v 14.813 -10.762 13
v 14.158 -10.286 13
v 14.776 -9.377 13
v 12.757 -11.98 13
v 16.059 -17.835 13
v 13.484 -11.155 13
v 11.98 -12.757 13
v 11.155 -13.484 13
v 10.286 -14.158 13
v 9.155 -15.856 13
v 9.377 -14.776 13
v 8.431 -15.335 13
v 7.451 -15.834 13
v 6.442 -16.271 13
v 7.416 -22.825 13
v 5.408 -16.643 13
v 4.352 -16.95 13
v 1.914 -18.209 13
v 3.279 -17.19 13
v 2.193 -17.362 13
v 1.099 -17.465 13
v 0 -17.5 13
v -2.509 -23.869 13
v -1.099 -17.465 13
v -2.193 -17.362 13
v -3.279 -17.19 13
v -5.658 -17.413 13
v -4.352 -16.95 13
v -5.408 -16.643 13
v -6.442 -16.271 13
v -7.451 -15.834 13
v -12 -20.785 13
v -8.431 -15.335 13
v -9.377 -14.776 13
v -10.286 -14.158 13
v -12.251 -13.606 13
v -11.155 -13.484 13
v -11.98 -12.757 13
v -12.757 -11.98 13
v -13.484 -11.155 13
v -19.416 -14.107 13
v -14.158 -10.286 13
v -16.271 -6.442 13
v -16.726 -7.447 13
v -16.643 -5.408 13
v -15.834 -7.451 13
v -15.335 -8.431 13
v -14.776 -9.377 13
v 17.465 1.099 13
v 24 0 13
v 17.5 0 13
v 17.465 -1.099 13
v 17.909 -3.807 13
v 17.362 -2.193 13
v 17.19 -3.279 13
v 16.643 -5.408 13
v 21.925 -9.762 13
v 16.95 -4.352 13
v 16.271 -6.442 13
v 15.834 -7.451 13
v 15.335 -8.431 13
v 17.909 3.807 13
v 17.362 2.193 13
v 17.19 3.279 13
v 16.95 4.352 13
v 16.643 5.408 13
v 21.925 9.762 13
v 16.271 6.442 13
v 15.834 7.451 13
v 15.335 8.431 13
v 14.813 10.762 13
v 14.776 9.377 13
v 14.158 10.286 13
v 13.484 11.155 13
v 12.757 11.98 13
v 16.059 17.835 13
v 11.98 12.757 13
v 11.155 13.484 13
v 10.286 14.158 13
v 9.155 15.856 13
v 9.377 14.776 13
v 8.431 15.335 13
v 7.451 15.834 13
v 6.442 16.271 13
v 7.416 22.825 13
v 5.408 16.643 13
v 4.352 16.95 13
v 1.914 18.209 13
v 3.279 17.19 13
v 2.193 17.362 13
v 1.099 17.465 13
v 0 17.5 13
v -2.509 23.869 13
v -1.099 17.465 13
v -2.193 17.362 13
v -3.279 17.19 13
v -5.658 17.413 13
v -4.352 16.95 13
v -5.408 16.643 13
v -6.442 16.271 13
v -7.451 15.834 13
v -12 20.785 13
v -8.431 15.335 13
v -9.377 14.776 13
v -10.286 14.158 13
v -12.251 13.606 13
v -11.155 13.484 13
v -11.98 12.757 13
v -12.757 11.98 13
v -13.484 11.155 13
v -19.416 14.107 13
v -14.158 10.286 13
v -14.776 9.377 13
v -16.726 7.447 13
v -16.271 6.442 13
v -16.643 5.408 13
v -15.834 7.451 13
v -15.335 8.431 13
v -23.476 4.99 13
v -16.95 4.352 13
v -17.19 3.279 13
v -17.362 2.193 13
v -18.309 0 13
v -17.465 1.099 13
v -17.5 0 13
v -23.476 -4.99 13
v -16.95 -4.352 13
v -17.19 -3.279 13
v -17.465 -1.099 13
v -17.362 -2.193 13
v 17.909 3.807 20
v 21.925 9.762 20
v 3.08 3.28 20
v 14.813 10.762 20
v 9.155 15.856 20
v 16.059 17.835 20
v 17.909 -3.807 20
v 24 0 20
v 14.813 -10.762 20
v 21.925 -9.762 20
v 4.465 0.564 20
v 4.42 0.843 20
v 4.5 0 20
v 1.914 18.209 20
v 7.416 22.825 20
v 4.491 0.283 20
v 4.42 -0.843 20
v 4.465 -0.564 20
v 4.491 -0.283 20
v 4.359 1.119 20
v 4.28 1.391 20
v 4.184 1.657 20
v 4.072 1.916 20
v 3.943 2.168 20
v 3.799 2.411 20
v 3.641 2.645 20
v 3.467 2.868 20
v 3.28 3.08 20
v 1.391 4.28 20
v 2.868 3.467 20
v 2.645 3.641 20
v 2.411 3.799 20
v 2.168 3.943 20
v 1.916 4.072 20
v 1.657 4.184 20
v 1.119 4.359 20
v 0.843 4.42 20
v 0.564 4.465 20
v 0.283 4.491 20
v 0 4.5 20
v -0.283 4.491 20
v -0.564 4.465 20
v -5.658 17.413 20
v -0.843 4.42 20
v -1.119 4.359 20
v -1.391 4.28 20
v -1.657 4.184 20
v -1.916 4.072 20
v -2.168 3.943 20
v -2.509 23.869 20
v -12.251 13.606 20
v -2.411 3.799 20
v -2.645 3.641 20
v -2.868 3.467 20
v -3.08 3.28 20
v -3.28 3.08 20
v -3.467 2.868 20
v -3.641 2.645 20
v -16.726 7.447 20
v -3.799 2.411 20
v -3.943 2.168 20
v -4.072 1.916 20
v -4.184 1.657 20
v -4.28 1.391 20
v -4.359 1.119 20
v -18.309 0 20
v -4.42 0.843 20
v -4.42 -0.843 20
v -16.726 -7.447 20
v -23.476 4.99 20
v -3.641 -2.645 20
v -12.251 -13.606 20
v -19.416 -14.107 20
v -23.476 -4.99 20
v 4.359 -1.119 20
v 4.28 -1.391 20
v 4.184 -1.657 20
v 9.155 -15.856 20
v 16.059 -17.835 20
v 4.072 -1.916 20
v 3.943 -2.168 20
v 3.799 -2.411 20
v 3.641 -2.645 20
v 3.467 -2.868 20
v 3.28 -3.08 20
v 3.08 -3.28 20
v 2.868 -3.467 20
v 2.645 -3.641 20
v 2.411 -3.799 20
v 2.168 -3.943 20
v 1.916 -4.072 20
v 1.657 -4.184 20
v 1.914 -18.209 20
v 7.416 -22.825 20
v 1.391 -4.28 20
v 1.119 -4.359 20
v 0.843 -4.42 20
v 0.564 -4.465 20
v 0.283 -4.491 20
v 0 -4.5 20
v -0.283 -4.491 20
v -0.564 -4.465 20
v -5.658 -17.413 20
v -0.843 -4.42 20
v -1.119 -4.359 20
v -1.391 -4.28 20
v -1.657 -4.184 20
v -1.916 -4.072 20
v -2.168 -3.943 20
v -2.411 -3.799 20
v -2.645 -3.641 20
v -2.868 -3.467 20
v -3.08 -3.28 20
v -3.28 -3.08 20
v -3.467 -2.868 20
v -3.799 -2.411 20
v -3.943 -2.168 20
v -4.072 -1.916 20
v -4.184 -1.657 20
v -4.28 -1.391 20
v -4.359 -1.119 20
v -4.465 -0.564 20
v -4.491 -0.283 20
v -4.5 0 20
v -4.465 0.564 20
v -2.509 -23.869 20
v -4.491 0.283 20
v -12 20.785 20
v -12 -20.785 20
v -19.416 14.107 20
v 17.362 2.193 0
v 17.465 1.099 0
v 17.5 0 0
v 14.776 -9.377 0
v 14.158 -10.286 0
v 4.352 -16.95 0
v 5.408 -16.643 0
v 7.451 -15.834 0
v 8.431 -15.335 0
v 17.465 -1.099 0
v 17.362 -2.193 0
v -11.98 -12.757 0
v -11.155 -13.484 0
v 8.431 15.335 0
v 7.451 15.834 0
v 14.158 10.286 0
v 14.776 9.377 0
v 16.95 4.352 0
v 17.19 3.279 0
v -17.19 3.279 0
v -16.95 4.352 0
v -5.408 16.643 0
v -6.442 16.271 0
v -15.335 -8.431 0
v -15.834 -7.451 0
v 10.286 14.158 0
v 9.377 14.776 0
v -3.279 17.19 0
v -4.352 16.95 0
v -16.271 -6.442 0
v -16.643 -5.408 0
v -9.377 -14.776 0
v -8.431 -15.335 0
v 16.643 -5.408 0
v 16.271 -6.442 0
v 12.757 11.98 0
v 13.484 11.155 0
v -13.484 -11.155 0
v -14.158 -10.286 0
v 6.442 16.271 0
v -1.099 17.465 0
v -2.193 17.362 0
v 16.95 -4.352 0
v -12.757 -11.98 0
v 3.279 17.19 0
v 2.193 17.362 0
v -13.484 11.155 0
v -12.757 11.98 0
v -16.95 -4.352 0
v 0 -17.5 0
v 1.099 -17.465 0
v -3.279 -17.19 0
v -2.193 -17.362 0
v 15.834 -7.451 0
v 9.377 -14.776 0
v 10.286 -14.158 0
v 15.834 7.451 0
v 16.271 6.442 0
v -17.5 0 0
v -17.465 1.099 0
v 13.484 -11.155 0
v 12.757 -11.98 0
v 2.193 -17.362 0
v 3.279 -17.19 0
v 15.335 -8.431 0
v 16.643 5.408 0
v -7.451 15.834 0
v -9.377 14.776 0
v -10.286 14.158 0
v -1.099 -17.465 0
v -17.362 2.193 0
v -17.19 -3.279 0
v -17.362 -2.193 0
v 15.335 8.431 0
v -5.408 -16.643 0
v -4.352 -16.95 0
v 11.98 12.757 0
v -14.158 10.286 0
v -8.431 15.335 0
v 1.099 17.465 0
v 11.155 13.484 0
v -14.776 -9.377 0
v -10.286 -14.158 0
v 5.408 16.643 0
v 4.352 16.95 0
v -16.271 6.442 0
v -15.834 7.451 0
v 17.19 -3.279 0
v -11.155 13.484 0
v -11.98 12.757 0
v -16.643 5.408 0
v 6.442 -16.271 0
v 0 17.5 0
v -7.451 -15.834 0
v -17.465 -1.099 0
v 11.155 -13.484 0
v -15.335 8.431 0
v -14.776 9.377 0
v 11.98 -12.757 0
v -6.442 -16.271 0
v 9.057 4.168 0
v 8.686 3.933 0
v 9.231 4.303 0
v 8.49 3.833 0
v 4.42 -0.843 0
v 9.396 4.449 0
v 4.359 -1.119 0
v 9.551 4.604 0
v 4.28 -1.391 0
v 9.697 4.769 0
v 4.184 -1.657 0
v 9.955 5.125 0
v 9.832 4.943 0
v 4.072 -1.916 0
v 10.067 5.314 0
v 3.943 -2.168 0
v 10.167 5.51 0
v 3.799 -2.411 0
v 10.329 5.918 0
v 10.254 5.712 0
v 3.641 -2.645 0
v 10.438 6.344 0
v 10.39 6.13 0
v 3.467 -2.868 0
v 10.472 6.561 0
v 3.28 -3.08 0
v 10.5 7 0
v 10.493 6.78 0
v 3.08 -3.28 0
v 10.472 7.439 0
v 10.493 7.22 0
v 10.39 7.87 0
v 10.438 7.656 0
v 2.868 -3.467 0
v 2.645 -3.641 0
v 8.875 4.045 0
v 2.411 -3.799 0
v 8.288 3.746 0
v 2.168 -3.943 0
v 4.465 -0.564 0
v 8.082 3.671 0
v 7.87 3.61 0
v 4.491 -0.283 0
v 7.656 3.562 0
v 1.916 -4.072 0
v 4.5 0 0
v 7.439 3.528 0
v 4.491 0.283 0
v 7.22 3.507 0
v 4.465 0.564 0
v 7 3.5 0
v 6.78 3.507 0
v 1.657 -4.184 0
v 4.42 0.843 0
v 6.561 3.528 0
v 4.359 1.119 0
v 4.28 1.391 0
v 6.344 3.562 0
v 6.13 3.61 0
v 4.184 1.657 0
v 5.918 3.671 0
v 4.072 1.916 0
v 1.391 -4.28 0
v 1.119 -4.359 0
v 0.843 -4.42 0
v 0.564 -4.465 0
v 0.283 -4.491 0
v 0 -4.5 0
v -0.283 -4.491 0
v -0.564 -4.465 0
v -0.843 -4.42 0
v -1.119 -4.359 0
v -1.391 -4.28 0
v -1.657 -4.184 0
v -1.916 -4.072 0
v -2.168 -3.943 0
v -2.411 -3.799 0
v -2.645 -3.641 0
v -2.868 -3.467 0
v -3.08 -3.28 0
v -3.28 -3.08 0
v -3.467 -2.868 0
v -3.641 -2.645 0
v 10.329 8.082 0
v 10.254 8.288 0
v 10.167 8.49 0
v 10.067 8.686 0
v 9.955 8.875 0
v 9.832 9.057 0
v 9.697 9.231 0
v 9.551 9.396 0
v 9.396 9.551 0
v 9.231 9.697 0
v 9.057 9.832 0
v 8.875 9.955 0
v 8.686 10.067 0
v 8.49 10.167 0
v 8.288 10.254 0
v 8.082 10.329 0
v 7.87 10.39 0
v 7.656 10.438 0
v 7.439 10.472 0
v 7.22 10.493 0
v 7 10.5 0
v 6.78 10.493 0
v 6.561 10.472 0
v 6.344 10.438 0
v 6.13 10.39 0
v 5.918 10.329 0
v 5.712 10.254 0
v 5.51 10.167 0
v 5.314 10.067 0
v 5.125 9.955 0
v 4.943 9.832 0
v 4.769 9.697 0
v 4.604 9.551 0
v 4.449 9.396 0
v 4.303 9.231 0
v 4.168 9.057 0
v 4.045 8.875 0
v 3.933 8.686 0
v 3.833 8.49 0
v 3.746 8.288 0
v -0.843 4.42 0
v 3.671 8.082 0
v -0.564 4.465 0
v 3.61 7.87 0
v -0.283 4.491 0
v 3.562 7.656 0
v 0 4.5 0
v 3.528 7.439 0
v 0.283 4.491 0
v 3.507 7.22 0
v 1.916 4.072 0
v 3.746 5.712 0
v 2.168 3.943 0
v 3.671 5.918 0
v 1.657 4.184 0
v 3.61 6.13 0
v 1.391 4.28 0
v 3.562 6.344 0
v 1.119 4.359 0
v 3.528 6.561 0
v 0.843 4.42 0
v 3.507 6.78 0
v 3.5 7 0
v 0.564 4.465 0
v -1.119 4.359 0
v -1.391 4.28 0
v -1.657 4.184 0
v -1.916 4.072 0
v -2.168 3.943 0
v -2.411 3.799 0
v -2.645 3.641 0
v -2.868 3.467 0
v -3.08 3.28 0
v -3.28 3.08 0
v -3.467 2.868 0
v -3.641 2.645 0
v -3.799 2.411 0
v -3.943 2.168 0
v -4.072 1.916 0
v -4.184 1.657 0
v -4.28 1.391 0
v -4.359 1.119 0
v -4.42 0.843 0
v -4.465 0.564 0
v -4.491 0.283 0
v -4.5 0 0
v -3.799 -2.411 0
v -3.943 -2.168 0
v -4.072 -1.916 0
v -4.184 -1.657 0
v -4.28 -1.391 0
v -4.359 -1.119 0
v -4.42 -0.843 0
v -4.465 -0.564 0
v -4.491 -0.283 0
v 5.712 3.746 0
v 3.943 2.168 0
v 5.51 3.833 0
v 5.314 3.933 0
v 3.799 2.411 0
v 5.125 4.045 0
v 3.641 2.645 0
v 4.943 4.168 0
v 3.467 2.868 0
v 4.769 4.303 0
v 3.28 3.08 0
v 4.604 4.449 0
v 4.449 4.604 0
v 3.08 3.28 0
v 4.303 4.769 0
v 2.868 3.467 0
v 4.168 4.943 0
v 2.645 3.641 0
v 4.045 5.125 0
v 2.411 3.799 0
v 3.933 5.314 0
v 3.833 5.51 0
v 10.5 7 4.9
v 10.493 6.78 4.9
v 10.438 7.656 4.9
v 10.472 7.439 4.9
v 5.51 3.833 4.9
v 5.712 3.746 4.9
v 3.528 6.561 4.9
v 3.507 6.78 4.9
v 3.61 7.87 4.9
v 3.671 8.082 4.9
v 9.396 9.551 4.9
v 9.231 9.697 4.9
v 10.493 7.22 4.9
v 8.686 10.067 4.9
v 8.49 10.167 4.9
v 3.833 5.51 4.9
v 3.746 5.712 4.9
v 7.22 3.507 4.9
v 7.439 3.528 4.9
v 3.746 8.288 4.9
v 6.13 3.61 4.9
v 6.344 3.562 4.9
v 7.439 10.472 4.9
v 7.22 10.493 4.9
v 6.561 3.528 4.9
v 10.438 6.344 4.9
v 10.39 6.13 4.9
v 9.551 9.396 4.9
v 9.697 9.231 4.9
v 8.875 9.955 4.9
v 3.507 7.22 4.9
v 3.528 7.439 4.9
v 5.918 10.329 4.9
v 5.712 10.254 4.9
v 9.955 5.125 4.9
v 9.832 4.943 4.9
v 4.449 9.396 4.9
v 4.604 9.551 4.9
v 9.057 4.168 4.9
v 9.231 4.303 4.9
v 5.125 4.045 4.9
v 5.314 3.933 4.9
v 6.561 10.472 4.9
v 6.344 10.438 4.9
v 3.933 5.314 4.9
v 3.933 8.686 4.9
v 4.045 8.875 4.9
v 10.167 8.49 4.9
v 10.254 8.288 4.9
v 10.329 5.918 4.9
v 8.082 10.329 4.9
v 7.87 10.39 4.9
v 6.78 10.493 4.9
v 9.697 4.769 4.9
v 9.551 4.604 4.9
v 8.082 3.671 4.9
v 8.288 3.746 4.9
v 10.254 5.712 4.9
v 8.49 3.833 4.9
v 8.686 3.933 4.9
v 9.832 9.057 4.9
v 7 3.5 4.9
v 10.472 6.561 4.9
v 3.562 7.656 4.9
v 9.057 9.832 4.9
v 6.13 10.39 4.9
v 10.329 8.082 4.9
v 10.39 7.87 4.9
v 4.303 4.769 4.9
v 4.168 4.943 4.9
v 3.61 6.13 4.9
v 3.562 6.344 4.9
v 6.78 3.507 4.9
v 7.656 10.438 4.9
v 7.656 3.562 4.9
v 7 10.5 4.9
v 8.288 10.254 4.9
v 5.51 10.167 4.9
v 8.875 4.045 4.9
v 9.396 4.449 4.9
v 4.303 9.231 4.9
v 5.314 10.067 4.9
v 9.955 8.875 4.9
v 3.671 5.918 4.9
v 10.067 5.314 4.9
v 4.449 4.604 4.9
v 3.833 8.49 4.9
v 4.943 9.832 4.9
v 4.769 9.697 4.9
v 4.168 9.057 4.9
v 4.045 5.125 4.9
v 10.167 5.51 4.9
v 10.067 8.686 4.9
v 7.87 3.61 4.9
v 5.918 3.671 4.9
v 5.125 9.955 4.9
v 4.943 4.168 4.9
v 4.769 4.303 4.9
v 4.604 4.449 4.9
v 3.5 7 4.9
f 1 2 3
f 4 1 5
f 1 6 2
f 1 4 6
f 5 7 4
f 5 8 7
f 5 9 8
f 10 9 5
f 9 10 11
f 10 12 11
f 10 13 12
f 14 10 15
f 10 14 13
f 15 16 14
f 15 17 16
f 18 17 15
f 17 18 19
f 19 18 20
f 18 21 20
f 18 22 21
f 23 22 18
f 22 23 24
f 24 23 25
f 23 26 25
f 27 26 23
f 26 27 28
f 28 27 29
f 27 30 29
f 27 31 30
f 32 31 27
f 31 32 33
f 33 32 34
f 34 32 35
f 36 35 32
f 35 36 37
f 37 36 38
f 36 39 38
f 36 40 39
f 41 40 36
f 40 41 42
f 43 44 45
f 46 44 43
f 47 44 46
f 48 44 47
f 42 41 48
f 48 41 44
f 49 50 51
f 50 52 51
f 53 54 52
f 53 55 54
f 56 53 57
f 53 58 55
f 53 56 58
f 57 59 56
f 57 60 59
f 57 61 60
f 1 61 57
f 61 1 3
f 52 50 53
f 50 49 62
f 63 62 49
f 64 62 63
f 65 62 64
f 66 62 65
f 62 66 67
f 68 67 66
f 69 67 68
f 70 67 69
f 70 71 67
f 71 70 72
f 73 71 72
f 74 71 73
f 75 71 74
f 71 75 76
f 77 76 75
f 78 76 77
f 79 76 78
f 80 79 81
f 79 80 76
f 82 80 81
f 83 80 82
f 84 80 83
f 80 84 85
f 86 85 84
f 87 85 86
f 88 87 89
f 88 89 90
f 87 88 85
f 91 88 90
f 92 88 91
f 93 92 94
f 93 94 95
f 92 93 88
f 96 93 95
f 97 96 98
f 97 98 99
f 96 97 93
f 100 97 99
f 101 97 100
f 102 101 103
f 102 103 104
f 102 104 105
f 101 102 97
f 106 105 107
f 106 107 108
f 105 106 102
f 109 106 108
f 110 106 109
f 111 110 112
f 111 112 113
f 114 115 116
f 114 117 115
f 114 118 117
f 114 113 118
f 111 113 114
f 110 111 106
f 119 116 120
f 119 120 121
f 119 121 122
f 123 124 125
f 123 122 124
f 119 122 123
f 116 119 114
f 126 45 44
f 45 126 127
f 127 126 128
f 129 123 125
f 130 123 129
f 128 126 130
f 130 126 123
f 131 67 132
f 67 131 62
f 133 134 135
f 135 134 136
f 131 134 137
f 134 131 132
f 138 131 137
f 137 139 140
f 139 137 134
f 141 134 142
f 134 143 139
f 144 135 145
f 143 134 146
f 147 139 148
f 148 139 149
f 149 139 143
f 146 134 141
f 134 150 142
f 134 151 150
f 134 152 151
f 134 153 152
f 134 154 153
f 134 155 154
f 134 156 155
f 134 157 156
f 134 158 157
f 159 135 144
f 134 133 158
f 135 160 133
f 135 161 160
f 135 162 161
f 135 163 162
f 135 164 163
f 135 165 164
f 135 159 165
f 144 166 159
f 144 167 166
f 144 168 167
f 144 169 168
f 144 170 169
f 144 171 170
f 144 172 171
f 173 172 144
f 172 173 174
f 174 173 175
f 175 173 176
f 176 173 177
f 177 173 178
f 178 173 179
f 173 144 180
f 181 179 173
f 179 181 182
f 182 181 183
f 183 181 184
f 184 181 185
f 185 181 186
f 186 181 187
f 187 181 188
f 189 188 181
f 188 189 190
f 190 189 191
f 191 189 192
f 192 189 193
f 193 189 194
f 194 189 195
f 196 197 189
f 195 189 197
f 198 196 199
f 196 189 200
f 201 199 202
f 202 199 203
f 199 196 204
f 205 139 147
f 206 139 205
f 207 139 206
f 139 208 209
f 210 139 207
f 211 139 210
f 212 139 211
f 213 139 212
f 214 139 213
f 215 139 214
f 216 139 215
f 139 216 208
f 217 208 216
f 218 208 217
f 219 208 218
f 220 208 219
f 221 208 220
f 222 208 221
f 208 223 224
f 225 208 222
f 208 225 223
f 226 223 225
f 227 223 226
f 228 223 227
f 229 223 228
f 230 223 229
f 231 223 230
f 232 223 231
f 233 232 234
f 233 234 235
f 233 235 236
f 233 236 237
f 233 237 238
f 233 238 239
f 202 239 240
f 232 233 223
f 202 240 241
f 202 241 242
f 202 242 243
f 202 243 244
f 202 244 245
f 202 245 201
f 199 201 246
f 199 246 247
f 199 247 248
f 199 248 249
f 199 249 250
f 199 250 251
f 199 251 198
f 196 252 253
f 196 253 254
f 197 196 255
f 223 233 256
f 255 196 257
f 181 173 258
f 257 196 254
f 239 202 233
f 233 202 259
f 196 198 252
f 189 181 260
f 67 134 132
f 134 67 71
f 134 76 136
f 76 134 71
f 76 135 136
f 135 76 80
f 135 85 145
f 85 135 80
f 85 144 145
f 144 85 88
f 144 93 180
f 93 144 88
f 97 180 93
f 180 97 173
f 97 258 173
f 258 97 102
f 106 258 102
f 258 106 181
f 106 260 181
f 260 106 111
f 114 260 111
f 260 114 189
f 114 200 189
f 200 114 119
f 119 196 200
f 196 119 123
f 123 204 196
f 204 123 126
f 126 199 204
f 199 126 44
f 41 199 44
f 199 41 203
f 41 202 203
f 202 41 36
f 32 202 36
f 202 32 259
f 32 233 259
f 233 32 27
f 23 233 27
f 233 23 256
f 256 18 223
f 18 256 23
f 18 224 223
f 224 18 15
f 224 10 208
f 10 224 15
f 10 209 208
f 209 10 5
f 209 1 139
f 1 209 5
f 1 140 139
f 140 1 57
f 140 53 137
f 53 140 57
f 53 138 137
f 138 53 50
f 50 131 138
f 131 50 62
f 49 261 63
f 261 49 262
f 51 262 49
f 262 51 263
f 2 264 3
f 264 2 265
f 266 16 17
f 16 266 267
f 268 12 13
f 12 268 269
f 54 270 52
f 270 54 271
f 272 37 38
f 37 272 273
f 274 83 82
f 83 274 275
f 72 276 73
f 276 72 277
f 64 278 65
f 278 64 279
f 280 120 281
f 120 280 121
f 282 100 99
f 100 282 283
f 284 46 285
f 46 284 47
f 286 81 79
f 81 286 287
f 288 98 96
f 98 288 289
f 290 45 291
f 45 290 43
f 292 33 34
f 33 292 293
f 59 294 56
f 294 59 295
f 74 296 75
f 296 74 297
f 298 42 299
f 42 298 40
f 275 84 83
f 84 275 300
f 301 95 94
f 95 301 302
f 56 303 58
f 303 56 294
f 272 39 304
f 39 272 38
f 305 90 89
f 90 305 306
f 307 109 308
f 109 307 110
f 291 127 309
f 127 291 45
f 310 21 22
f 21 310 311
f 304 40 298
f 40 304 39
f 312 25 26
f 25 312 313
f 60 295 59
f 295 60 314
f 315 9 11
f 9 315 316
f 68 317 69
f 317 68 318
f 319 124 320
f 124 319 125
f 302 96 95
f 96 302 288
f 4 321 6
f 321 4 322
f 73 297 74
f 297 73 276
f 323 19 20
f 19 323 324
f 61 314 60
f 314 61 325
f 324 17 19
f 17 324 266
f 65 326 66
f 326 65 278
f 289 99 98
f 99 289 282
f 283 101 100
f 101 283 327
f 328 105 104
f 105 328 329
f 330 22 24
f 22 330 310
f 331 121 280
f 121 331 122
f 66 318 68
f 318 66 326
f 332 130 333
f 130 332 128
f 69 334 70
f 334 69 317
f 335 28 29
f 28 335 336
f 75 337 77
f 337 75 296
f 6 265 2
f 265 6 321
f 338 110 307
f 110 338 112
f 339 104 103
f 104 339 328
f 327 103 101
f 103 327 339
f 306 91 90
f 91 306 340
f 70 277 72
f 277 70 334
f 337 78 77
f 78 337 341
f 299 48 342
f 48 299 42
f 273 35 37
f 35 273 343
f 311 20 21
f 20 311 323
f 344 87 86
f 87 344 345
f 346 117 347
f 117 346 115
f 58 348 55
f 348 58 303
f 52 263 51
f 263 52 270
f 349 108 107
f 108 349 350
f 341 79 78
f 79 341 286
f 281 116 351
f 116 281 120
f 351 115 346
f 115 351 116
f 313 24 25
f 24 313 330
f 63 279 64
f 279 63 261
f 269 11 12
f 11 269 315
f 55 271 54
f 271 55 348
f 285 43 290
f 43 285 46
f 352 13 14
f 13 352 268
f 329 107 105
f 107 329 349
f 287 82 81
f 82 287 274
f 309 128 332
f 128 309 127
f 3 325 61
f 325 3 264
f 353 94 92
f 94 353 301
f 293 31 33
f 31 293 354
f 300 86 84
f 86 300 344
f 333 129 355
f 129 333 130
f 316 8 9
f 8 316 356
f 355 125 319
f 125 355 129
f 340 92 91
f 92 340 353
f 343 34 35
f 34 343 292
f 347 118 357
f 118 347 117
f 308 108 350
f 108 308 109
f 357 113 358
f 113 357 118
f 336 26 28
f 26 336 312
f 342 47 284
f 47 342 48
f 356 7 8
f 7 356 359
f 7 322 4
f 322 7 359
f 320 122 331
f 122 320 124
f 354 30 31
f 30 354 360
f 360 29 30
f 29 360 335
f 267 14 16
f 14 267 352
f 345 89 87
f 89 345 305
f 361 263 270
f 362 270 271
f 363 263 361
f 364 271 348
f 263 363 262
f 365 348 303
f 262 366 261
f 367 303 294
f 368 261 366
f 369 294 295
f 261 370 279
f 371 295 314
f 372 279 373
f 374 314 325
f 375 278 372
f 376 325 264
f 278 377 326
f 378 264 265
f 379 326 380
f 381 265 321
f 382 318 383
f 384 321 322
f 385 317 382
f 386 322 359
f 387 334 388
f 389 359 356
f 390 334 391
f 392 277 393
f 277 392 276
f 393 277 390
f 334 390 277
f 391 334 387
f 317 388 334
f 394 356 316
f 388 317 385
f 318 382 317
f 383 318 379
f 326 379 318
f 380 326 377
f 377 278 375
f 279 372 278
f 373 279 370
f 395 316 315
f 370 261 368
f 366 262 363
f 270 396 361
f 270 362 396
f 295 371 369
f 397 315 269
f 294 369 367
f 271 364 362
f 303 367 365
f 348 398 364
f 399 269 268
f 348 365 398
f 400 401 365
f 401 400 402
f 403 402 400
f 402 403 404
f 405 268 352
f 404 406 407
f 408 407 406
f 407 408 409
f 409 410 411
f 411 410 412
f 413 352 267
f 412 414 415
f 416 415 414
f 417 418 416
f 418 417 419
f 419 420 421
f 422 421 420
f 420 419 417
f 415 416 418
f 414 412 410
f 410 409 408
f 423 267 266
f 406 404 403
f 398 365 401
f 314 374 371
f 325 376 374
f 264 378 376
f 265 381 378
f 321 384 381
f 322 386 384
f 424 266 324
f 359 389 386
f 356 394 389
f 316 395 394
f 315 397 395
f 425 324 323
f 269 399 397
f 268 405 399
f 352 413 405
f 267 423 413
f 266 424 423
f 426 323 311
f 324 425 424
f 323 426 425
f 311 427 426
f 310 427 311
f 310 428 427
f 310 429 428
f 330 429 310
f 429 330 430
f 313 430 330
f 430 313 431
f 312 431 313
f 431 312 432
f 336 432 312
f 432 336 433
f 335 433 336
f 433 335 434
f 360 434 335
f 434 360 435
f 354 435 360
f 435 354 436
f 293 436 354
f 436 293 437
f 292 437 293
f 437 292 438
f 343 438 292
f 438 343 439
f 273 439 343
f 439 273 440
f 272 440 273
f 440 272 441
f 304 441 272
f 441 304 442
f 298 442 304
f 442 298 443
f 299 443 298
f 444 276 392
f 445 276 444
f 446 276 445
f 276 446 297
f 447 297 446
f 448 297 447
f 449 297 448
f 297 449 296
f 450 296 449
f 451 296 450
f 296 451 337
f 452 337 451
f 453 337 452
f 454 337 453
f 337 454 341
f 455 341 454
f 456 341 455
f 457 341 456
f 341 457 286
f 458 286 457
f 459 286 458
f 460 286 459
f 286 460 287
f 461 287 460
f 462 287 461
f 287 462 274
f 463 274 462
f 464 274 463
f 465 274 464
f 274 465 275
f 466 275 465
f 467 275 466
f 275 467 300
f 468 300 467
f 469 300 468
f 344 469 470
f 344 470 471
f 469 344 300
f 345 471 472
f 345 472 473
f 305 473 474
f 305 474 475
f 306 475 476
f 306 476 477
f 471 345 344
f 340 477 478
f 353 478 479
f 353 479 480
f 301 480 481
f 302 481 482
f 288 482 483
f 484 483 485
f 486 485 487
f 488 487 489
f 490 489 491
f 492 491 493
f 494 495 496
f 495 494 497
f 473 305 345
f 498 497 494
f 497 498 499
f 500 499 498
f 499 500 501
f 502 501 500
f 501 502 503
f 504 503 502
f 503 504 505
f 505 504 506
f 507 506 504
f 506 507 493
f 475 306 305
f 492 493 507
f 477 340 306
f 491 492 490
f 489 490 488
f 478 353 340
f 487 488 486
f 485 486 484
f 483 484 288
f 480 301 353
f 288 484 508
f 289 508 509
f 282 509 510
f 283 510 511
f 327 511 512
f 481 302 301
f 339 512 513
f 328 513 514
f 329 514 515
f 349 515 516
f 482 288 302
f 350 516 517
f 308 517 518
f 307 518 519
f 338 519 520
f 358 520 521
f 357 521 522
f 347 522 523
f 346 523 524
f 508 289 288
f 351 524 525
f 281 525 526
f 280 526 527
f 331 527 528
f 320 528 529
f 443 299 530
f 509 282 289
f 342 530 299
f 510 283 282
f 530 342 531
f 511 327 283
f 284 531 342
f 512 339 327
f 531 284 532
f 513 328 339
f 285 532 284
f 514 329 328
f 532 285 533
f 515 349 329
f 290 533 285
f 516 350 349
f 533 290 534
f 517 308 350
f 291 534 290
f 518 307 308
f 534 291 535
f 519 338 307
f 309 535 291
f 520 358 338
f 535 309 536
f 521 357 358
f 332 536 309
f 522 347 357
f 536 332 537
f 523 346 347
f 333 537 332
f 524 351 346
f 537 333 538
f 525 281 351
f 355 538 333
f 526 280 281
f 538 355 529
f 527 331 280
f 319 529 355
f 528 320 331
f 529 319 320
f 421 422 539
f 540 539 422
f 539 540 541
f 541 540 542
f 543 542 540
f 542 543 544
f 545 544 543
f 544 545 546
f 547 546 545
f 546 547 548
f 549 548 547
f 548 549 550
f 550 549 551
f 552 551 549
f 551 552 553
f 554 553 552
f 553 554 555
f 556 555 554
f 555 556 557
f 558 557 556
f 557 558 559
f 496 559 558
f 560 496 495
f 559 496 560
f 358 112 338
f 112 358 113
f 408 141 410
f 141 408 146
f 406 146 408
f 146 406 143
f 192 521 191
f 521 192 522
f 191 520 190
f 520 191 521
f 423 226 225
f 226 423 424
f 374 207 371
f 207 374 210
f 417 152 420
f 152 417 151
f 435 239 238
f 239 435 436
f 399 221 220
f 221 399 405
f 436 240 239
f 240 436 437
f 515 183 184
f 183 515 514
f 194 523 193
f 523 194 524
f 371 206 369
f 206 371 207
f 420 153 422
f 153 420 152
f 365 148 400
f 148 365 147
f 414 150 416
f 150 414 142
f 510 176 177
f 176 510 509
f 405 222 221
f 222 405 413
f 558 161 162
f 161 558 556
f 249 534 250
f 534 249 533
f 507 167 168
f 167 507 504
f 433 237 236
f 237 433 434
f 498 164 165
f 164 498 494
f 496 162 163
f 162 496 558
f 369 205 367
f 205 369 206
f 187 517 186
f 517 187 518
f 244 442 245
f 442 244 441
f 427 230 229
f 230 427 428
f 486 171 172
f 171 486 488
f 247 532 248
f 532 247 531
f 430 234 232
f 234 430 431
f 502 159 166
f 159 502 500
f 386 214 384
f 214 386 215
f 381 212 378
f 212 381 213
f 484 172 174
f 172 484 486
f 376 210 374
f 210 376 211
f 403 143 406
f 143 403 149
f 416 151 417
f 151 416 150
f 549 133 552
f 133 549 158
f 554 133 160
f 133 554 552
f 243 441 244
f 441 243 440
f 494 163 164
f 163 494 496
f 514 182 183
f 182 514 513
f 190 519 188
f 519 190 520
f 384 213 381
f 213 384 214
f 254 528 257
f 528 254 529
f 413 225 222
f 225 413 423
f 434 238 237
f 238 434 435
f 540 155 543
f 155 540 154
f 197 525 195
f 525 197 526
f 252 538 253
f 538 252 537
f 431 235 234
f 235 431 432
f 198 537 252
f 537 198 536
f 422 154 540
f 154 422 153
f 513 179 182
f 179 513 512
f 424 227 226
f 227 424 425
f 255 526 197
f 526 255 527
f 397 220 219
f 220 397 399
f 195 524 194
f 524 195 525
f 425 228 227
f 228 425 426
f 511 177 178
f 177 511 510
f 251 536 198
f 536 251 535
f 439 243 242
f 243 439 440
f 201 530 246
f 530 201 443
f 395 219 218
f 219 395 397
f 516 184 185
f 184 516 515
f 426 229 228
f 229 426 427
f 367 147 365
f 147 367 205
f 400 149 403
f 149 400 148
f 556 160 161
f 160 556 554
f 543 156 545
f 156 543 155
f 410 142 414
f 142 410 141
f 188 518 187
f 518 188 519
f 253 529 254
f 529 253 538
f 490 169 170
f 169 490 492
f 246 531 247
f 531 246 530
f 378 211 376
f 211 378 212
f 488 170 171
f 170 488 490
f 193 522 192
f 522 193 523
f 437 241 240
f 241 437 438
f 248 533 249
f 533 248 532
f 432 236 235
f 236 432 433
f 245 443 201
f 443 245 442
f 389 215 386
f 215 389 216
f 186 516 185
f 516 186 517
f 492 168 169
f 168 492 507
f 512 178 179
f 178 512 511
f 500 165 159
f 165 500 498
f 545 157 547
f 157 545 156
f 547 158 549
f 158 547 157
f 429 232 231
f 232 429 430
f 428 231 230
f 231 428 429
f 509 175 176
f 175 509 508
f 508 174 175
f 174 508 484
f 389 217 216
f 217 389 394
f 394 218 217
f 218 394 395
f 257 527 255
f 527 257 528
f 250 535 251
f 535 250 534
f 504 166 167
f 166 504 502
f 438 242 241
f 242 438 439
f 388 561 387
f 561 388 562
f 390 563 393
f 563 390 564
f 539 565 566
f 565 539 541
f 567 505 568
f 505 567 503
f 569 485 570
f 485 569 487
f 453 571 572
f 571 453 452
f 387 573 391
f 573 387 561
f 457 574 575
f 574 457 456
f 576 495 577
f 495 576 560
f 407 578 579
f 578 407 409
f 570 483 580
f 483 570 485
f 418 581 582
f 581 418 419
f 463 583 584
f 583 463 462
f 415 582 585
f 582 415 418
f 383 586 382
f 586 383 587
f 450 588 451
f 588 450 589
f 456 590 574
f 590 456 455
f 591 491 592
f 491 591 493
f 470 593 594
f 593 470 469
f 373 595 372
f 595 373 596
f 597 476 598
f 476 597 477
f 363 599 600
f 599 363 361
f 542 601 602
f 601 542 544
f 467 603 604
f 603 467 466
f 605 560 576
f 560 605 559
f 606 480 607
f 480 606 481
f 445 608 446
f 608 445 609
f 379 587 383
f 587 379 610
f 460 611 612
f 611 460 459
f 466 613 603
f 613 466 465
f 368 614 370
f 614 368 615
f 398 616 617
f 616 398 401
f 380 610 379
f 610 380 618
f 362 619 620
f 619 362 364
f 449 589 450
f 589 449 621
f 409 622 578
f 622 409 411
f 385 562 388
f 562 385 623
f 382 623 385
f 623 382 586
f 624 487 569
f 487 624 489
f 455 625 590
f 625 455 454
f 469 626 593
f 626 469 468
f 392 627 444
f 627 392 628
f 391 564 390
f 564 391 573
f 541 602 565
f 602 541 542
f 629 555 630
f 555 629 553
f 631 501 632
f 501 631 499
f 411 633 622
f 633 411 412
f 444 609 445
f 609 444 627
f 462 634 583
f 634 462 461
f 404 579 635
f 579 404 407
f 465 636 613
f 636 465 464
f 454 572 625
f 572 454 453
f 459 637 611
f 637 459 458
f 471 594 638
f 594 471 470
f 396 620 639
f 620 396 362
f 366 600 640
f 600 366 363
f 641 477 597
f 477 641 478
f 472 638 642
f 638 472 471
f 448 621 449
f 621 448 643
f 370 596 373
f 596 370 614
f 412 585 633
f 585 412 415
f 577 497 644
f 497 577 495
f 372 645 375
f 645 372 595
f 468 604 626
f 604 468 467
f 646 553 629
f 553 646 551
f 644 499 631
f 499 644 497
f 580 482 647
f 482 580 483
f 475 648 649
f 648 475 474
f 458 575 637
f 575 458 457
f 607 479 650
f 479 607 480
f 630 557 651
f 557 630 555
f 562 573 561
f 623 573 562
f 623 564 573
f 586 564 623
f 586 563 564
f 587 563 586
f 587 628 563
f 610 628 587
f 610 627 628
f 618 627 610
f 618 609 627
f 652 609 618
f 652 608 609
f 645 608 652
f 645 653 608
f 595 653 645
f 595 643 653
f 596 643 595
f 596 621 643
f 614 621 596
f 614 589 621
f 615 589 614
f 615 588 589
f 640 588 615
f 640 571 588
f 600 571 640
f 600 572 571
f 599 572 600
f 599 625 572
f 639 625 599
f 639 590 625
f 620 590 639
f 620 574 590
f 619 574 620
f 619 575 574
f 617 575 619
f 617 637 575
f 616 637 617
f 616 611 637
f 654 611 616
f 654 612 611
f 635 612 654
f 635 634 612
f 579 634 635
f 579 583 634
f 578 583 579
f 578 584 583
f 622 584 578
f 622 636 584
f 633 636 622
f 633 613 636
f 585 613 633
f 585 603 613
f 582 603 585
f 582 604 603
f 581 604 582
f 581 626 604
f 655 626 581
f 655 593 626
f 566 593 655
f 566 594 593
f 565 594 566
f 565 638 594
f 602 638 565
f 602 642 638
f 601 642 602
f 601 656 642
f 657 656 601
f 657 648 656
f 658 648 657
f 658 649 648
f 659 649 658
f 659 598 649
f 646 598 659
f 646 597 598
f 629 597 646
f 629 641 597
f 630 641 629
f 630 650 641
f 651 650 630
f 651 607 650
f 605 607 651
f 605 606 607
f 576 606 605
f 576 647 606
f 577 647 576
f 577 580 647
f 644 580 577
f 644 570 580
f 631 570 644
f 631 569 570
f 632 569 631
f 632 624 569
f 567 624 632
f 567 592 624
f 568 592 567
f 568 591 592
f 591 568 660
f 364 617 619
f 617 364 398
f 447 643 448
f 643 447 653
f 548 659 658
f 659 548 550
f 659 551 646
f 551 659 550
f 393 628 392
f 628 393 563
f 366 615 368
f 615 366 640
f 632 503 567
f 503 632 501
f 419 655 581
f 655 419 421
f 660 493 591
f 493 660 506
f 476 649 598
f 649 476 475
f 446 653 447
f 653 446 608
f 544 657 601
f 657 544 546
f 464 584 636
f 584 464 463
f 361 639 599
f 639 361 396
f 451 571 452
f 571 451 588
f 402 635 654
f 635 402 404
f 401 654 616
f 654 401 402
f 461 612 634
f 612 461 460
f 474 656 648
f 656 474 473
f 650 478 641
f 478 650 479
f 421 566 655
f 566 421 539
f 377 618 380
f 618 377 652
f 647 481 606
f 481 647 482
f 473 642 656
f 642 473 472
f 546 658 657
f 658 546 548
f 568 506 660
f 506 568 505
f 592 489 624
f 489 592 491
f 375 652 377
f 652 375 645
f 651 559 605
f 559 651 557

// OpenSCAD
$fn=100;
difference(){
		union()
		{
		cylinder(20,d=35);
		for(i=[1:1:15]){
			rotate([0,0,360/15*i]) translate([16,0,13]) 
				linear_extrude(7)
					polygon([[0,-5],[0,5],[8,0]]);
		}

		
		}
	translate([0,0,-10.1]) cylinder(30.2,d=9);
	translate([7,7,-10.1]) cylinder(15,d=7);
	}
